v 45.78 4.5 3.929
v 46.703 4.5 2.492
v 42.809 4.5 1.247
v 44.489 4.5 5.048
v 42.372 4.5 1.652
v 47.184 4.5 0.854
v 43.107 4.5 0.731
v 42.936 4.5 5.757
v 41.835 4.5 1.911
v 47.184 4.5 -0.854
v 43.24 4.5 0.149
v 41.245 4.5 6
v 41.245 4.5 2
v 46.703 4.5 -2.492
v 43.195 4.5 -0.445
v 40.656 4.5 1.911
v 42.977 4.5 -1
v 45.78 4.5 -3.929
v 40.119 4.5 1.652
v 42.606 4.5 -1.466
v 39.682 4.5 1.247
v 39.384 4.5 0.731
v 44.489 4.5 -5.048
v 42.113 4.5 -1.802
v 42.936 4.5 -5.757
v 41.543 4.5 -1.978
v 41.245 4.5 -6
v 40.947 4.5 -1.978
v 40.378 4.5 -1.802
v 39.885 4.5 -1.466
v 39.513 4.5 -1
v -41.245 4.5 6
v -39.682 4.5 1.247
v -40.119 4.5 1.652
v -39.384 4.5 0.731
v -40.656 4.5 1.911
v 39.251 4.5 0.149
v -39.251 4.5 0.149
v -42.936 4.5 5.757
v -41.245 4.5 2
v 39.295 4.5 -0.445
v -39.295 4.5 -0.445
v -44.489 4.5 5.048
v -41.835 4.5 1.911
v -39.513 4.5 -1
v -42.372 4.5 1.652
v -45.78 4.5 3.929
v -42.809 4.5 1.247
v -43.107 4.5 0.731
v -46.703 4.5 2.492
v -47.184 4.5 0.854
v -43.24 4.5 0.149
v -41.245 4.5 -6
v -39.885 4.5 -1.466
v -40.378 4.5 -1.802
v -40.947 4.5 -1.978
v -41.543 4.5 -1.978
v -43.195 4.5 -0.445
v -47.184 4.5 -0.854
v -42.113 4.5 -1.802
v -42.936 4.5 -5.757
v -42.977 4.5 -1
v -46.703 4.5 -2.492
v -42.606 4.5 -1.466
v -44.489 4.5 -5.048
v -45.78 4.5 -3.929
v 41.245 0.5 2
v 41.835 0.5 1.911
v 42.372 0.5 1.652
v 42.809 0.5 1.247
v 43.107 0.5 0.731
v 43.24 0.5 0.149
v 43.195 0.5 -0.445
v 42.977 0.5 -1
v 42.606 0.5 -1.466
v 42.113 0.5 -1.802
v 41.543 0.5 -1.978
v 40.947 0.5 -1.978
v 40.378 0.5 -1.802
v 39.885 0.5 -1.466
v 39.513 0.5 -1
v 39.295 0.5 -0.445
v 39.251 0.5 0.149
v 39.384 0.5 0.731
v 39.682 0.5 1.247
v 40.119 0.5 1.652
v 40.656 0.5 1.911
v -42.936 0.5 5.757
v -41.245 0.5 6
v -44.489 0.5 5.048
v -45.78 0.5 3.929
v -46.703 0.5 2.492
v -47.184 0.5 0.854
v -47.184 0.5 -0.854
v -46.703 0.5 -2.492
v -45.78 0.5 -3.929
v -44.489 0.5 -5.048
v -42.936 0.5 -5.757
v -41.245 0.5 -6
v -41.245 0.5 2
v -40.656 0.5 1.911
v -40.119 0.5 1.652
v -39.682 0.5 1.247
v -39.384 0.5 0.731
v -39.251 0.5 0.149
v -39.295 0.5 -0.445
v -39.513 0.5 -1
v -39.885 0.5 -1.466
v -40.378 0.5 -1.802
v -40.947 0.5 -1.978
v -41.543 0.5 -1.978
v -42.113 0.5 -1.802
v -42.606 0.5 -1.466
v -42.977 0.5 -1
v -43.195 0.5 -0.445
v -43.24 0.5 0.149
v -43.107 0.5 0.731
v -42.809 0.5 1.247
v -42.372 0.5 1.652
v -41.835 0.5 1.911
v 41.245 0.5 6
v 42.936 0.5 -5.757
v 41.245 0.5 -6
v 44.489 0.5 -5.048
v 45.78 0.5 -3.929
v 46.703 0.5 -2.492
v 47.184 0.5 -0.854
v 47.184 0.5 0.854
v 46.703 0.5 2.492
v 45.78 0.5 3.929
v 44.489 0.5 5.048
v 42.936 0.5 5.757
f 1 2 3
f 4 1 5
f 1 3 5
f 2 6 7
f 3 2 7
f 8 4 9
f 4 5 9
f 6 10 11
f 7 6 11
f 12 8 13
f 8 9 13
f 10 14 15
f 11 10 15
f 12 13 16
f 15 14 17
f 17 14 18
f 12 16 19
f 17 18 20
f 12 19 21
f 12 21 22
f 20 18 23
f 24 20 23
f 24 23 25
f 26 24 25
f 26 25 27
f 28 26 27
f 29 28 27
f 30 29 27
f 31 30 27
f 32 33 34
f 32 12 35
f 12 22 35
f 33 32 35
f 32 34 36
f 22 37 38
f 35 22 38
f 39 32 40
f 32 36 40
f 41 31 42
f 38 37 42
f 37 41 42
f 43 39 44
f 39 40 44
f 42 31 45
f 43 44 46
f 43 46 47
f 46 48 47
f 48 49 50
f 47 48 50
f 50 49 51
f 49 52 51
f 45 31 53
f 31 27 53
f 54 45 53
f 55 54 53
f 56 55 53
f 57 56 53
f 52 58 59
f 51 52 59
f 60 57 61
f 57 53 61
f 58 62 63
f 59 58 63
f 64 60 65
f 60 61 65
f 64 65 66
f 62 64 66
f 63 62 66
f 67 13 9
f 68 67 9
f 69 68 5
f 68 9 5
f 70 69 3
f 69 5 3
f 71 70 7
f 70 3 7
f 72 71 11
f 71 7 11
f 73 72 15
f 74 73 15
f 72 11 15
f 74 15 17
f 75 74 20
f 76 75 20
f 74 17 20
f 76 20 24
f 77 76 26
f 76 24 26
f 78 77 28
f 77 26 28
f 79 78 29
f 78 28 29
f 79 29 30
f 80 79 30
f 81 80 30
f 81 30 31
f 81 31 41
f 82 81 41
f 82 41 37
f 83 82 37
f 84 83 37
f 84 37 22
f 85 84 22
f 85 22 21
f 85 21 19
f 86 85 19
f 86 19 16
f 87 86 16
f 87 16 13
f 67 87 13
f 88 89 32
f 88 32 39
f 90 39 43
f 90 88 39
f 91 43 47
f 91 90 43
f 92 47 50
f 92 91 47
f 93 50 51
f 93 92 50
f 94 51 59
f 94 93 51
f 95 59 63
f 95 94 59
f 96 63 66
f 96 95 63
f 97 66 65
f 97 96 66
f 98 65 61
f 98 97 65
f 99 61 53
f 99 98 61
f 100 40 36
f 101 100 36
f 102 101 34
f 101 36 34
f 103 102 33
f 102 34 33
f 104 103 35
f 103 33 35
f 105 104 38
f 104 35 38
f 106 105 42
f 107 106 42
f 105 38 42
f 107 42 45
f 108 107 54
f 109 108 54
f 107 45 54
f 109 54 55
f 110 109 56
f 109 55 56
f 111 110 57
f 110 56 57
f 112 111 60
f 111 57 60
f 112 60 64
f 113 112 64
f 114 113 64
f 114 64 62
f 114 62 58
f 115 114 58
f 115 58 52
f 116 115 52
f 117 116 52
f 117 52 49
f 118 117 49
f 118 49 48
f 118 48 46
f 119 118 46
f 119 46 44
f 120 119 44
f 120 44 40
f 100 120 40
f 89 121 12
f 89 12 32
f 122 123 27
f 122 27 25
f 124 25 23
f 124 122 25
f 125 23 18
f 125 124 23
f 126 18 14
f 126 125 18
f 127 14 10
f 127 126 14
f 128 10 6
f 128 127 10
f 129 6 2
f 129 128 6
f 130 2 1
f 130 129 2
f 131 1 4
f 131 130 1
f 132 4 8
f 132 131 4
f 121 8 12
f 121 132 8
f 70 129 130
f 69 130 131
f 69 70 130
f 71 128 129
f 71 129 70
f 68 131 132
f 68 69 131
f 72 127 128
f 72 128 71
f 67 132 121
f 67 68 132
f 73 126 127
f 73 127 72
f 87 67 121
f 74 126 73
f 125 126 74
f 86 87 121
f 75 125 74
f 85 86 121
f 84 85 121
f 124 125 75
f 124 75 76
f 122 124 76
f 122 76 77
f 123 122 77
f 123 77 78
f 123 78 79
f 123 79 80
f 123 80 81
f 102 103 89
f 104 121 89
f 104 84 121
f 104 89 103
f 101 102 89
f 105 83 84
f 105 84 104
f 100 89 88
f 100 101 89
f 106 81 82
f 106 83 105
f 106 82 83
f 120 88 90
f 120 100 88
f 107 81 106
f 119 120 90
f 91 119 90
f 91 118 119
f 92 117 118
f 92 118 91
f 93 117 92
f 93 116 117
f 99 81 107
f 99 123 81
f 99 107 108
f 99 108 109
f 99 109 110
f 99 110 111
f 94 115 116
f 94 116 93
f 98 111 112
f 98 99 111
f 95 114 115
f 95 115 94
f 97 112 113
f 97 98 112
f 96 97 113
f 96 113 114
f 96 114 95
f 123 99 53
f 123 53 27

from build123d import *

# Parameters (mm, degrees)
SKETCH1_R           = 2.4
BOSS_EXTRUDE1_DEPTH = 5
SCALE1_SCALE        = 0.8
SKETCH2_R           = 2
CUT_EXTRUDE1_DEPTH  = 48.792424581


with BuildPart() as part:
    # Sketch1 → Boss-Extrude1 (new body)
    with BuildSketch(Plane(origin=(0, 0, 0), x_dir=(1, 0, 0), z_dir=(0, 1, 0))):
        with BuildLine():
            Line((-51.5565916, 7.5), (51.5565916, 7.5))
            ThreePointArc((51.5565916, 7.5), (59.0565916, 0), (51.5565916, -7.5))
            Line((51.5565916, -7.5), (-51.5565916, -7.5))
            ThreePointArc((-51.5565916, -7.5), (-59.0565916, 0), (-51.5565916, 7.5))
        make_face()
        with Locations(Location((-51.5565916, 0, 0), (0, 0, 270))):
            Circle(SKETCH1_R, mode=Mode.SUBTRACT)
        with Locations(Location((51.5565916, 0, 0), (0, 0, 270))):
            Circle(SKETCH1_R, mode=Mode.SUBTRACT)
    extrude(amount=BOSS_EXTRUDE1_DEPTH)


with BuildPart() as part_1:
    # Scale1: scaled about (0, 2.5, 0)
    add(part.part.scale(SCALE1_SCALE).moved(Location((0, 0.5, 0))))

    # Sketch2 → Cut-Extrude1 (cut, through all)
    with BuildSketch(Plane(origin=(0, 4.5, 0), x_dir=(1, 0, 0), z_dir=(0, 1, 0))):
        with Locations(Location((-41.24527328, 0, 0), (0, 0, 270))):
            Circle(SKETCH2_R)
        with Locations(Location((41.24527328, 0, 0), (0, 0, 270))):
            Circle(SKETCH2_R)
    extrude(amount=-CUT_EXTRUDE1_DEPTH, mode=Mode.SUBTRACT)


solid = part_1.part
